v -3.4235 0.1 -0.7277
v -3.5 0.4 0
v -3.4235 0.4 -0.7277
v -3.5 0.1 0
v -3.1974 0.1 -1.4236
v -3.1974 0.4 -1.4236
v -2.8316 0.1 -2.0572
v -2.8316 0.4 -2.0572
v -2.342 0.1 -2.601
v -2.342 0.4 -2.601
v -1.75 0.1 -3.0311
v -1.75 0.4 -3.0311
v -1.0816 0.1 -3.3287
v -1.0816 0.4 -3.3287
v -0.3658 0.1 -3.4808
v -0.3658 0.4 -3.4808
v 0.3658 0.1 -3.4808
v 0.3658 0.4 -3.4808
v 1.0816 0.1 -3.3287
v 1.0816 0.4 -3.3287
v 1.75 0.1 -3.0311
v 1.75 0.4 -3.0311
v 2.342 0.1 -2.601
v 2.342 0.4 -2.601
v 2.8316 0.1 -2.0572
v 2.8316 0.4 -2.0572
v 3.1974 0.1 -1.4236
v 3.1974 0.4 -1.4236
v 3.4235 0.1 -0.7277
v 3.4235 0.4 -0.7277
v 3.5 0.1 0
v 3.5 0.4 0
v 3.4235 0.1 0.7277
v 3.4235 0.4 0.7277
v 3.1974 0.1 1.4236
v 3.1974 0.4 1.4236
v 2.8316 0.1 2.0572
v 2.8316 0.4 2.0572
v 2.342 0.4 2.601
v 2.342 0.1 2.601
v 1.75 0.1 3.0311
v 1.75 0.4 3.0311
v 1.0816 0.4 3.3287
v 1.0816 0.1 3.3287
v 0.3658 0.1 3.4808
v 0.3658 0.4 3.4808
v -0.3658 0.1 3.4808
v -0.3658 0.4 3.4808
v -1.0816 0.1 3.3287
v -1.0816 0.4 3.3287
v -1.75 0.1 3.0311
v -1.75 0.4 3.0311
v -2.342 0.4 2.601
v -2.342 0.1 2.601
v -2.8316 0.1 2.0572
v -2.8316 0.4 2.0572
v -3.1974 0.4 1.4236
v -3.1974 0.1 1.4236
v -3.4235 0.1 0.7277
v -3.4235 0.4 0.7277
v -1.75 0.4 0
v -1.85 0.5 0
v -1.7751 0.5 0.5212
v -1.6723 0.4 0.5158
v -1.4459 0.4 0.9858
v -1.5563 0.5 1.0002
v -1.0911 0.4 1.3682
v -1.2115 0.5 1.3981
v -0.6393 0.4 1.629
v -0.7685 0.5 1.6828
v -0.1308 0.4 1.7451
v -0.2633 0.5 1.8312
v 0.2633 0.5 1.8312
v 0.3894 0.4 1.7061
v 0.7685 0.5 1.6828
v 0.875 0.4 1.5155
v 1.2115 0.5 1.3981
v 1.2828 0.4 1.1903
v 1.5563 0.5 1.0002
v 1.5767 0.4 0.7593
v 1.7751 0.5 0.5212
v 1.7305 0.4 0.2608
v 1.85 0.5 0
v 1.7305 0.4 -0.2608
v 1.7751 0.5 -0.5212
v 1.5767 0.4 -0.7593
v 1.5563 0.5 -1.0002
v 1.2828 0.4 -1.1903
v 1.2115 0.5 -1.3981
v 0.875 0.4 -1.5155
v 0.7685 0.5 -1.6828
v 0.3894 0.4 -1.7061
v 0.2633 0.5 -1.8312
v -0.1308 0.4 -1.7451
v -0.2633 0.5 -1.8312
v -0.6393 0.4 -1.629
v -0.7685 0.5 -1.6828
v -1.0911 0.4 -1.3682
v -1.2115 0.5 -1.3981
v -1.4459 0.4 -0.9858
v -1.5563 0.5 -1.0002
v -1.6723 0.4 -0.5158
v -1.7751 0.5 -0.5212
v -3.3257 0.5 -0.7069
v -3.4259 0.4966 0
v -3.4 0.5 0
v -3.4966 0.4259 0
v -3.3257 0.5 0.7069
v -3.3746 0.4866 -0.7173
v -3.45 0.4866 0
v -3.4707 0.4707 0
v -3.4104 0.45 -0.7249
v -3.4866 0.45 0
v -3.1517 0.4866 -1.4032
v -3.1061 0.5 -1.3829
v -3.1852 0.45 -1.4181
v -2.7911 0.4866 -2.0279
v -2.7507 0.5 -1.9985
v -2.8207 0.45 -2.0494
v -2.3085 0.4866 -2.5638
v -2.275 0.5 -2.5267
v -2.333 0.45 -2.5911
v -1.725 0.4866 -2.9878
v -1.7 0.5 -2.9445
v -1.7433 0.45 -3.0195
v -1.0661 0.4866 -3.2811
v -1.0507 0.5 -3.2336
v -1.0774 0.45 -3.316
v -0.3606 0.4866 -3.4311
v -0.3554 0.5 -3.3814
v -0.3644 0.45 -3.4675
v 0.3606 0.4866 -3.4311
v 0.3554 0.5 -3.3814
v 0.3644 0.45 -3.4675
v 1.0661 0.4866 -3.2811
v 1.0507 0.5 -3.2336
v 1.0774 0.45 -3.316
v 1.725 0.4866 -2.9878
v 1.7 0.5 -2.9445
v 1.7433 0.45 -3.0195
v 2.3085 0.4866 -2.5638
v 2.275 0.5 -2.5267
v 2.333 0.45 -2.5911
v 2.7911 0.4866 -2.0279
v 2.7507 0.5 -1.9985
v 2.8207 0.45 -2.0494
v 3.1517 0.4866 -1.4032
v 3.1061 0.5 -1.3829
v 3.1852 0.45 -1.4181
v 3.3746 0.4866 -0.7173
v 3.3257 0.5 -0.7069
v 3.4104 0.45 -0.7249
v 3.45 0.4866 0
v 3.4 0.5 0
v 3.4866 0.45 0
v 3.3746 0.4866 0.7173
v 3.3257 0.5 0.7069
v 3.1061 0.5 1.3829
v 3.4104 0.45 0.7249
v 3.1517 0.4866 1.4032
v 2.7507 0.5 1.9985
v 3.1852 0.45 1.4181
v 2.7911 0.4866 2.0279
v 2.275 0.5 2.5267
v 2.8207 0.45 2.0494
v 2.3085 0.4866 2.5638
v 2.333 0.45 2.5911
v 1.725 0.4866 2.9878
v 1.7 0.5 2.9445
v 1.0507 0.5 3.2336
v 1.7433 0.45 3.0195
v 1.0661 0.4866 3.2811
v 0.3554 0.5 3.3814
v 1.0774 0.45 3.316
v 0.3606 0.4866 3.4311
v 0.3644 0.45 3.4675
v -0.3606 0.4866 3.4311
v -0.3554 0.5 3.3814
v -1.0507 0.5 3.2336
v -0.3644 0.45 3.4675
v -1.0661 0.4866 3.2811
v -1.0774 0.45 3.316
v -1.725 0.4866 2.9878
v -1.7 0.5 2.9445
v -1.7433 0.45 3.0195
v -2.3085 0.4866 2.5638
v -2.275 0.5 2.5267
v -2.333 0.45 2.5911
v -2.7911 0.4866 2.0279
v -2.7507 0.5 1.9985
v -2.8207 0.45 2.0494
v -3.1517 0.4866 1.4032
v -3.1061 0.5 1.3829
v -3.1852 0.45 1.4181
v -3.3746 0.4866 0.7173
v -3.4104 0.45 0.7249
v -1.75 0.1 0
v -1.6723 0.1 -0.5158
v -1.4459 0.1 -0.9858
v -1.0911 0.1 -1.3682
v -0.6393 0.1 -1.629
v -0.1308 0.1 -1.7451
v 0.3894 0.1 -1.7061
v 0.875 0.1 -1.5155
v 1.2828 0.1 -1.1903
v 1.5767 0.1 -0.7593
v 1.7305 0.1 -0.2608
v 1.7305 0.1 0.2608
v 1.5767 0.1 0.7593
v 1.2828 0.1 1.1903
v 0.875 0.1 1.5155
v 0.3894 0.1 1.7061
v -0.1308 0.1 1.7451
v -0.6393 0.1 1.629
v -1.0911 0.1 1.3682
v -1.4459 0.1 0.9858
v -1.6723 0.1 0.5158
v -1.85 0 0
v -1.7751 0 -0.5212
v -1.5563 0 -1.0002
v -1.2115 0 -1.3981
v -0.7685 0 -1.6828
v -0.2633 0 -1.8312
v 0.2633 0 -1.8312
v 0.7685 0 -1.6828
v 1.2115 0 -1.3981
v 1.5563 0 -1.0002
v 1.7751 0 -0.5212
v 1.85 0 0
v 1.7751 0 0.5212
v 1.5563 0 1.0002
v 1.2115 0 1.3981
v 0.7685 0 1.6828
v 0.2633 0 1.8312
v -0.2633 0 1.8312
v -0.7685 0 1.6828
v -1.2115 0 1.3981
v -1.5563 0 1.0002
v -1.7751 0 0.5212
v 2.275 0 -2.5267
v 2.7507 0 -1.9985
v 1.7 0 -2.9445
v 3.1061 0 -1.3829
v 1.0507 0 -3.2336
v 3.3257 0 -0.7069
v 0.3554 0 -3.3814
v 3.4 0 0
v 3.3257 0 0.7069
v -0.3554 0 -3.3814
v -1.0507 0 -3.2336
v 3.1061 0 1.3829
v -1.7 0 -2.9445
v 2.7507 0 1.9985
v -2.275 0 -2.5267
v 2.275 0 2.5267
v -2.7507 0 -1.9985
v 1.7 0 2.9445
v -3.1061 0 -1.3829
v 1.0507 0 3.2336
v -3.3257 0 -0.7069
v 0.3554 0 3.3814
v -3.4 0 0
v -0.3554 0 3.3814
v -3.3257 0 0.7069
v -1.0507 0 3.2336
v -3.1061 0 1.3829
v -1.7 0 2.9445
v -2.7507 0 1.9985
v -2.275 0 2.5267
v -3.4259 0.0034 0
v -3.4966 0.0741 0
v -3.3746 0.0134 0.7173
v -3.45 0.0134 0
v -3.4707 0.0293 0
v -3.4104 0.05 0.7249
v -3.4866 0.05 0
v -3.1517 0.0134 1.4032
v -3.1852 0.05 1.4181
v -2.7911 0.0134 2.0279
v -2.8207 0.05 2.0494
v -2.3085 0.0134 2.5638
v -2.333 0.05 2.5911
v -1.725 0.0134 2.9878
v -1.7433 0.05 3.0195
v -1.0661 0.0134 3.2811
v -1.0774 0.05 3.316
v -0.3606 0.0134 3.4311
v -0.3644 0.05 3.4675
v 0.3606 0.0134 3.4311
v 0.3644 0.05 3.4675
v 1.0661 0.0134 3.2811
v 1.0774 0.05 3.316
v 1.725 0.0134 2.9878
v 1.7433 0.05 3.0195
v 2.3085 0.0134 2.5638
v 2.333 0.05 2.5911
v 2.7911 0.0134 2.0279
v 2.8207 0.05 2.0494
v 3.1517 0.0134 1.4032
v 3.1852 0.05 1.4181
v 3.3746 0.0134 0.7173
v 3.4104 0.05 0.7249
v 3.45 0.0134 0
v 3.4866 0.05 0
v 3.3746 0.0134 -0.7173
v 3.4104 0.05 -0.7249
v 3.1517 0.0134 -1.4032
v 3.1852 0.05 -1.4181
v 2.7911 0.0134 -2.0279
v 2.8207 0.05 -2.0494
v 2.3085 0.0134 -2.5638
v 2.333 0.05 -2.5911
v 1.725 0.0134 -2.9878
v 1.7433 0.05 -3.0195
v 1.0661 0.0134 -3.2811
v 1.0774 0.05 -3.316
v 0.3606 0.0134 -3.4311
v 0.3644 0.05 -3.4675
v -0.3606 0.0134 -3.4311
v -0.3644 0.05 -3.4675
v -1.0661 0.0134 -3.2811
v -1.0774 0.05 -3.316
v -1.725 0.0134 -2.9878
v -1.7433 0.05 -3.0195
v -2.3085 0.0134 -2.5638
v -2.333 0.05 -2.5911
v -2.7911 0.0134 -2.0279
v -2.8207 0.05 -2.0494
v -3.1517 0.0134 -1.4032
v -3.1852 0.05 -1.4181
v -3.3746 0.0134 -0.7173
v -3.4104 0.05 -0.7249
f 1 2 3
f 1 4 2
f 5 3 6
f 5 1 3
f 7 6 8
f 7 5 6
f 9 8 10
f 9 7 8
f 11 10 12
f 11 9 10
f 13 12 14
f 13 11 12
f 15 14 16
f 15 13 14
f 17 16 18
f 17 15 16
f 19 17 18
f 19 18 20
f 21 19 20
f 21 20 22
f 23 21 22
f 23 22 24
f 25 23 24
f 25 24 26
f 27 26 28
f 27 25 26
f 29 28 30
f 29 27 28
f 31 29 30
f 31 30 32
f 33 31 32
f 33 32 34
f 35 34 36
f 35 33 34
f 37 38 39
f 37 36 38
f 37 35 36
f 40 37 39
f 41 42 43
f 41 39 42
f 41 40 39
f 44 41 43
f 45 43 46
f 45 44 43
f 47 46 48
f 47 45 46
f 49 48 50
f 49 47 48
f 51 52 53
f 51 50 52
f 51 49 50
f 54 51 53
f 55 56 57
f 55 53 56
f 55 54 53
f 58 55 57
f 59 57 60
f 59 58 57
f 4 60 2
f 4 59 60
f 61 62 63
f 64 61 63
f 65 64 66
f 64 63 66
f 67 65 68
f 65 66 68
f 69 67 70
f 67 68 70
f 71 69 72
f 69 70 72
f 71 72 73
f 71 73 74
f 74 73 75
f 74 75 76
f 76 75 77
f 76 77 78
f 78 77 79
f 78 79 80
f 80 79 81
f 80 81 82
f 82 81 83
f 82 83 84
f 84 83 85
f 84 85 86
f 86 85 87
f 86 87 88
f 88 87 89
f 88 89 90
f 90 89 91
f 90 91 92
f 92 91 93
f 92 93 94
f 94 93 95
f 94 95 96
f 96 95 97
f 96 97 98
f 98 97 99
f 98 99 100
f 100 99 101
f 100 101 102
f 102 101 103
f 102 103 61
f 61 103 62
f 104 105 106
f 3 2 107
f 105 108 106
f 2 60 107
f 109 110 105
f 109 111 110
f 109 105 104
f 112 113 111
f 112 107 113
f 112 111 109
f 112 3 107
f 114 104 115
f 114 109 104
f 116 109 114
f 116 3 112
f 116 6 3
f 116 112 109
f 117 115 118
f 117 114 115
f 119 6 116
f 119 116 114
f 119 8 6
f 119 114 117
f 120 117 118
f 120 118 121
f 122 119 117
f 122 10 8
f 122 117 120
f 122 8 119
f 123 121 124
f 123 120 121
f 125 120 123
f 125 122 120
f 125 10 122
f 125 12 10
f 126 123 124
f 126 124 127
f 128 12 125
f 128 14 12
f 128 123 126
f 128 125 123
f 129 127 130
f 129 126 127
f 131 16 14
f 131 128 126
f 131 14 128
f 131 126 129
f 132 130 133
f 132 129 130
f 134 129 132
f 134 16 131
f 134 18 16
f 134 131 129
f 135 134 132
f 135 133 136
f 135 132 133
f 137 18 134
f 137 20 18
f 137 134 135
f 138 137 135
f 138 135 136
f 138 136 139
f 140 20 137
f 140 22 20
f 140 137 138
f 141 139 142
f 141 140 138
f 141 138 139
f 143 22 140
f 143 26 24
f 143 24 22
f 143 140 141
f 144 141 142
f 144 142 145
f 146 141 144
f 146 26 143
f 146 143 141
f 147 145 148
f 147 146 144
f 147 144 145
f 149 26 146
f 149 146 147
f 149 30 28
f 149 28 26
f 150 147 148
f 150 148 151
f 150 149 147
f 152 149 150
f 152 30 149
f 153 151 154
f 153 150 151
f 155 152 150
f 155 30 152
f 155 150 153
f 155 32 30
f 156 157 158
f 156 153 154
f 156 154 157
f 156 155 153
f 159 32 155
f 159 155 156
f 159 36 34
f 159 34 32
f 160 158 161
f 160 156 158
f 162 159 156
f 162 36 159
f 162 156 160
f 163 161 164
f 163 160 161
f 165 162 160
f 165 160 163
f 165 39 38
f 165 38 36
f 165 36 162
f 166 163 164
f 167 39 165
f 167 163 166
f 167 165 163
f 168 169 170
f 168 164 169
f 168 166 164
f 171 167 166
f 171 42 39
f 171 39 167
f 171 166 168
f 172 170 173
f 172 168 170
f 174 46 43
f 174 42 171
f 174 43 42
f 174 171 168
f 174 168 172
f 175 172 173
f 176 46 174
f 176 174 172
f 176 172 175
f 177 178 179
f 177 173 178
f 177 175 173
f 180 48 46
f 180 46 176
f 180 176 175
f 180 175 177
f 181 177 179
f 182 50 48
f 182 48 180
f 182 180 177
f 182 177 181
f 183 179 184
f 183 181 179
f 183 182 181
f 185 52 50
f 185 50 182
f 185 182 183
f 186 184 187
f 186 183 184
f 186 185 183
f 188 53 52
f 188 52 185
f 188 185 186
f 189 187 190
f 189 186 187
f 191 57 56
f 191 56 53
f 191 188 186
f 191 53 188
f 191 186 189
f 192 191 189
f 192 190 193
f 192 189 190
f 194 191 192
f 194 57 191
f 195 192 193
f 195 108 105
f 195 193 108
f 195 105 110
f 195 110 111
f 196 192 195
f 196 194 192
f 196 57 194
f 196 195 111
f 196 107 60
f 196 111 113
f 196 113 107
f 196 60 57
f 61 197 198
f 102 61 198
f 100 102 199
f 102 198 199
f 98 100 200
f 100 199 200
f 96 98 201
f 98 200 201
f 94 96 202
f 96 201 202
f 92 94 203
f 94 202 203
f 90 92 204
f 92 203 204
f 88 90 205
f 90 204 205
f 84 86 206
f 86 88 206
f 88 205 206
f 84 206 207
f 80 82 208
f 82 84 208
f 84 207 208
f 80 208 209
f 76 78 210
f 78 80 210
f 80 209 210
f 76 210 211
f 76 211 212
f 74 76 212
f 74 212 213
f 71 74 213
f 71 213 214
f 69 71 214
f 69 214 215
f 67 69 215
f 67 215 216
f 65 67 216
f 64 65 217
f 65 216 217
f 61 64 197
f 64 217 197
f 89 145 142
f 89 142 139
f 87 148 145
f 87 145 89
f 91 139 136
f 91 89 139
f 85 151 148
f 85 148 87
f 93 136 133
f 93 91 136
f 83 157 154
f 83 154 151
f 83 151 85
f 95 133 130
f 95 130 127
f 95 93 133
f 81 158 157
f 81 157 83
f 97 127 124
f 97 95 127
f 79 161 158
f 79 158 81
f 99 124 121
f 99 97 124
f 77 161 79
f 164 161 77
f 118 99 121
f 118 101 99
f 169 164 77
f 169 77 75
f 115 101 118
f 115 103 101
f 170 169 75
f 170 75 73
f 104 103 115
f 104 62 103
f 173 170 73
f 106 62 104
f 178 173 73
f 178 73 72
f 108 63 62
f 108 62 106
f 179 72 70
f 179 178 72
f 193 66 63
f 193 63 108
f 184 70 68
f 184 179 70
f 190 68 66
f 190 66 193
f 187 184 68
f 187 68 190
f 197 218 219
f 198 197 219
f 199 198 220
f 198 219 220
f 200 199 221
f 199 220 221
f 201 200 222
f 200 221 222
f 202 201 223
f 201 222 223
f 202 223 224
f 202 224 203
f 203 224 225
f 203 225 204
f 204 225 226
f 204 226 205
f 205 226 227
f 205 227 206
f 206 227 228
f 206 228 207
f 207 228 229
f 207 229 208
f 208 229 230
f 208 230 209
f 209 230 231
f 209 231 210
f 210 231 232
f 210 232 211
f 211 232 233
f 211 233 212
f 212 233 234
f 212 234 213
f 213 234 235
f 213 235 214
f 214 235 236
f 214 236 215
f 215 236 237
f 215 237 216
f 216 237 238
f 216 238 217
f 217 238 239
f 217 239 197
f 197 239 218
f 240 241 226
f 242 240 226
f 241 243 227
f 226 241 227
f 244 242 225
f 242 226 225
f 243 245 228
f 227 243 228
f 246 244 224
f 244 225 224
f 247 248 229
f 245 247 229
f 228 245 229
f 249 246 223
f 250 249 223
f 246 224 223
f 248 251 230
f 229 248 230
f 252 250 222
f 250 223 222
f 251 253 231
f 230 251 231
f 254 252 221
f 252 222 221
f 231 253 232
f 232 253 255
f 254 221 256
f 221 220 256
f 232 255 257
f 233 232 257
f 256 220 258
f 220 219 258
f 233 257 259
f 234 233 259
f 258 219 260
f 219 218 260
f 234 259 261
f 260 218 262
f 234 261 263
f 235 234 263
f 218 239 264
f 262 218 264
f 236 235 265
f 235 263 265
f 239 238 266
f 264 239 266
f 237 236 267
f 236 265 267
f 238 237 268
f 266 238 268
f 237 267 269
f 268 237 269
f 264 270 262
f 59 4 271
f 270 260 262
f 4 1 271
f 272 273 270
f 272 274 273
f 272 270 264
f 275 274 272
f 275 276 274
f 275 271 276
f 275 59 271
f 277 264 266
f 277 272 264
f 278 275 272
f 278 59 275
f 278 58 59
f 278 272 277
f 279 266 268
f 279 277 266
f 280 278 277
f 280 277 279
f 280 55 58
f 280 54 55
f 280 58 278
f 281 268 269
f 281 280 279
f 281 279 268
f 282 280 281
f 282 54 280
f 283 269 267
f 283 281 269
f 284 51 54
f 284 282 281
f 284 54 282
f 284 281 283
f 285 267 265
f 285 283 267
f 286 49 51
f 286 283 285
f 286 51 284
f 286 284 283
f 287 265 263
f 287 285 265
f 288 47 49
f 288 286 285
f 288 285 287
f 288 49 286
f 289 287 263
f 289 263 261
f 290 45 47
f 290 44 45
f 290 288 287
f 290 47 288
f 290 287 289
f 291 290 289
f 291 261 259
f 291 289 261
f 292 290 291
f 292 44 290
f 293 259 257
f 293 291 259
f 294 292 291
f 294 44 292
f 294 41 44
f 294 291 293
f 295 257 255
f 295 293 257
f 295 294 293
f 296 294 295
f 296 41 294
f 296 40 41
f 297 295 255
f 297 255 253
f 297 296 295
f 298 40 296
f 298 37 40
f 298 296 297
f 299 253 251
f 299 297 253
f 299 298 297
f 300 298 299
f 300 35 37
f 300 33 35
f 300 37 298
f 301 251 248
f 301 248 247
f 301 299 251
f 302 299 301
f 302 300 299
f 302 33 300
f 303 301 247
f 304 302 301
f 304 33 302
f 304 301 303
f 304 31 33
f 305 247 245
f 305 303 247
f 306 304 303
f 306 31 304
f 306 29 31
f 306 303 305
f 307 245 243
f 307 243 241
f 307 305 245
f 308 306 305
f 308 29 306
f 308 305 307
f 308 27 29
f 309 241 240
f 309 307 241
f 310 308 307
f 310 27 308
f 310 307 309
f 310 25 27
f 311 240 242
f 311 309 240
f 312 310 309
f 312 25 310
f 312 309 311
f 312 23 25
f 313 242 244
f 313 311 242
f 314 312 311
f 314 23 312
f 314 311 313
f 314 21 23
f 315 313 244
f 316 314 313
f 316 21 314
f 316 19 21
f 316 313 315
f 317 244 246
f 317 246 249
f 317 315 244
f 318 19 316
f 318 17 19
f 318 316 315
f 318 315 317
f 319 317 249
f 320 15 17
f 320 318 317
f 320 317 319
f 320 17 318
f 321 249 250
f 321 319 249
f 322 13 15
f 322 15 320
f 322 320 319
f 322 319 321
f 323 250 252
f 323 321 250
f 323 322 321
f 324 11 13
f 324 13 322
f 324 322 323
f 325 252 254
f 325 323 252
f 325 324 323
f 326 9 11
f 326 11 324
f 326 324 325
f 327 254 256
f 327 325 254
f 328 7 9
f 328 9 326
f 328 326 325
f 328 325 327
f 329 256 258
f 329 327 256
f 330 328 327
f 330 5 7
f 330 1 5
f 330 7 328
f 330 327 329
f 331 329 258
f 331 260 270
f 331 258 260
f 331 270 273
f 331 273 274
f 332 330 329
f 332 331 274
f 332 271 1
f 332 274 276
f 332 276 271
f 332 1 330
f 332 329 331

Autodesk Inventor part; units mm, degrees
ref_plane "YZ Plane" through (0, 0, 0) normal (1, 0, 0) x (0, 1, 0)
ref_plane "XZ Plane" through (0, 0, 0) normal (0, 1, 0) x (-1, 0, 0)
ref_plane "XY Plane" through (0, 0, 0) normal (0, 0, 1) x (1, 0, 0)
sketch "Sketch1" plane through (0, 0, 0) normal (0, 1, 0) x (-1, 0, 0)
  circle A0 centre (0, 0) radius 1.75
  circle A1 centre (0, 0) radius 3.5
  dimension "d0" = 3.5
  dimension "d1" = 7
extrude "Extrusion1" add sketch "Sketch1" along normal blind 0.5
chamfer "Chamfer1" distance 0.1 angle 45 2 edges at (1.75, 0, 0) (1.75, 0.5, 0)
fillet "Fillet1" radius 0.1 2 edges at (3.5, 0.5, 0) (3.5, 0, 0)
properties part number "M3 Screw Washer" material "Stainless Steel"
